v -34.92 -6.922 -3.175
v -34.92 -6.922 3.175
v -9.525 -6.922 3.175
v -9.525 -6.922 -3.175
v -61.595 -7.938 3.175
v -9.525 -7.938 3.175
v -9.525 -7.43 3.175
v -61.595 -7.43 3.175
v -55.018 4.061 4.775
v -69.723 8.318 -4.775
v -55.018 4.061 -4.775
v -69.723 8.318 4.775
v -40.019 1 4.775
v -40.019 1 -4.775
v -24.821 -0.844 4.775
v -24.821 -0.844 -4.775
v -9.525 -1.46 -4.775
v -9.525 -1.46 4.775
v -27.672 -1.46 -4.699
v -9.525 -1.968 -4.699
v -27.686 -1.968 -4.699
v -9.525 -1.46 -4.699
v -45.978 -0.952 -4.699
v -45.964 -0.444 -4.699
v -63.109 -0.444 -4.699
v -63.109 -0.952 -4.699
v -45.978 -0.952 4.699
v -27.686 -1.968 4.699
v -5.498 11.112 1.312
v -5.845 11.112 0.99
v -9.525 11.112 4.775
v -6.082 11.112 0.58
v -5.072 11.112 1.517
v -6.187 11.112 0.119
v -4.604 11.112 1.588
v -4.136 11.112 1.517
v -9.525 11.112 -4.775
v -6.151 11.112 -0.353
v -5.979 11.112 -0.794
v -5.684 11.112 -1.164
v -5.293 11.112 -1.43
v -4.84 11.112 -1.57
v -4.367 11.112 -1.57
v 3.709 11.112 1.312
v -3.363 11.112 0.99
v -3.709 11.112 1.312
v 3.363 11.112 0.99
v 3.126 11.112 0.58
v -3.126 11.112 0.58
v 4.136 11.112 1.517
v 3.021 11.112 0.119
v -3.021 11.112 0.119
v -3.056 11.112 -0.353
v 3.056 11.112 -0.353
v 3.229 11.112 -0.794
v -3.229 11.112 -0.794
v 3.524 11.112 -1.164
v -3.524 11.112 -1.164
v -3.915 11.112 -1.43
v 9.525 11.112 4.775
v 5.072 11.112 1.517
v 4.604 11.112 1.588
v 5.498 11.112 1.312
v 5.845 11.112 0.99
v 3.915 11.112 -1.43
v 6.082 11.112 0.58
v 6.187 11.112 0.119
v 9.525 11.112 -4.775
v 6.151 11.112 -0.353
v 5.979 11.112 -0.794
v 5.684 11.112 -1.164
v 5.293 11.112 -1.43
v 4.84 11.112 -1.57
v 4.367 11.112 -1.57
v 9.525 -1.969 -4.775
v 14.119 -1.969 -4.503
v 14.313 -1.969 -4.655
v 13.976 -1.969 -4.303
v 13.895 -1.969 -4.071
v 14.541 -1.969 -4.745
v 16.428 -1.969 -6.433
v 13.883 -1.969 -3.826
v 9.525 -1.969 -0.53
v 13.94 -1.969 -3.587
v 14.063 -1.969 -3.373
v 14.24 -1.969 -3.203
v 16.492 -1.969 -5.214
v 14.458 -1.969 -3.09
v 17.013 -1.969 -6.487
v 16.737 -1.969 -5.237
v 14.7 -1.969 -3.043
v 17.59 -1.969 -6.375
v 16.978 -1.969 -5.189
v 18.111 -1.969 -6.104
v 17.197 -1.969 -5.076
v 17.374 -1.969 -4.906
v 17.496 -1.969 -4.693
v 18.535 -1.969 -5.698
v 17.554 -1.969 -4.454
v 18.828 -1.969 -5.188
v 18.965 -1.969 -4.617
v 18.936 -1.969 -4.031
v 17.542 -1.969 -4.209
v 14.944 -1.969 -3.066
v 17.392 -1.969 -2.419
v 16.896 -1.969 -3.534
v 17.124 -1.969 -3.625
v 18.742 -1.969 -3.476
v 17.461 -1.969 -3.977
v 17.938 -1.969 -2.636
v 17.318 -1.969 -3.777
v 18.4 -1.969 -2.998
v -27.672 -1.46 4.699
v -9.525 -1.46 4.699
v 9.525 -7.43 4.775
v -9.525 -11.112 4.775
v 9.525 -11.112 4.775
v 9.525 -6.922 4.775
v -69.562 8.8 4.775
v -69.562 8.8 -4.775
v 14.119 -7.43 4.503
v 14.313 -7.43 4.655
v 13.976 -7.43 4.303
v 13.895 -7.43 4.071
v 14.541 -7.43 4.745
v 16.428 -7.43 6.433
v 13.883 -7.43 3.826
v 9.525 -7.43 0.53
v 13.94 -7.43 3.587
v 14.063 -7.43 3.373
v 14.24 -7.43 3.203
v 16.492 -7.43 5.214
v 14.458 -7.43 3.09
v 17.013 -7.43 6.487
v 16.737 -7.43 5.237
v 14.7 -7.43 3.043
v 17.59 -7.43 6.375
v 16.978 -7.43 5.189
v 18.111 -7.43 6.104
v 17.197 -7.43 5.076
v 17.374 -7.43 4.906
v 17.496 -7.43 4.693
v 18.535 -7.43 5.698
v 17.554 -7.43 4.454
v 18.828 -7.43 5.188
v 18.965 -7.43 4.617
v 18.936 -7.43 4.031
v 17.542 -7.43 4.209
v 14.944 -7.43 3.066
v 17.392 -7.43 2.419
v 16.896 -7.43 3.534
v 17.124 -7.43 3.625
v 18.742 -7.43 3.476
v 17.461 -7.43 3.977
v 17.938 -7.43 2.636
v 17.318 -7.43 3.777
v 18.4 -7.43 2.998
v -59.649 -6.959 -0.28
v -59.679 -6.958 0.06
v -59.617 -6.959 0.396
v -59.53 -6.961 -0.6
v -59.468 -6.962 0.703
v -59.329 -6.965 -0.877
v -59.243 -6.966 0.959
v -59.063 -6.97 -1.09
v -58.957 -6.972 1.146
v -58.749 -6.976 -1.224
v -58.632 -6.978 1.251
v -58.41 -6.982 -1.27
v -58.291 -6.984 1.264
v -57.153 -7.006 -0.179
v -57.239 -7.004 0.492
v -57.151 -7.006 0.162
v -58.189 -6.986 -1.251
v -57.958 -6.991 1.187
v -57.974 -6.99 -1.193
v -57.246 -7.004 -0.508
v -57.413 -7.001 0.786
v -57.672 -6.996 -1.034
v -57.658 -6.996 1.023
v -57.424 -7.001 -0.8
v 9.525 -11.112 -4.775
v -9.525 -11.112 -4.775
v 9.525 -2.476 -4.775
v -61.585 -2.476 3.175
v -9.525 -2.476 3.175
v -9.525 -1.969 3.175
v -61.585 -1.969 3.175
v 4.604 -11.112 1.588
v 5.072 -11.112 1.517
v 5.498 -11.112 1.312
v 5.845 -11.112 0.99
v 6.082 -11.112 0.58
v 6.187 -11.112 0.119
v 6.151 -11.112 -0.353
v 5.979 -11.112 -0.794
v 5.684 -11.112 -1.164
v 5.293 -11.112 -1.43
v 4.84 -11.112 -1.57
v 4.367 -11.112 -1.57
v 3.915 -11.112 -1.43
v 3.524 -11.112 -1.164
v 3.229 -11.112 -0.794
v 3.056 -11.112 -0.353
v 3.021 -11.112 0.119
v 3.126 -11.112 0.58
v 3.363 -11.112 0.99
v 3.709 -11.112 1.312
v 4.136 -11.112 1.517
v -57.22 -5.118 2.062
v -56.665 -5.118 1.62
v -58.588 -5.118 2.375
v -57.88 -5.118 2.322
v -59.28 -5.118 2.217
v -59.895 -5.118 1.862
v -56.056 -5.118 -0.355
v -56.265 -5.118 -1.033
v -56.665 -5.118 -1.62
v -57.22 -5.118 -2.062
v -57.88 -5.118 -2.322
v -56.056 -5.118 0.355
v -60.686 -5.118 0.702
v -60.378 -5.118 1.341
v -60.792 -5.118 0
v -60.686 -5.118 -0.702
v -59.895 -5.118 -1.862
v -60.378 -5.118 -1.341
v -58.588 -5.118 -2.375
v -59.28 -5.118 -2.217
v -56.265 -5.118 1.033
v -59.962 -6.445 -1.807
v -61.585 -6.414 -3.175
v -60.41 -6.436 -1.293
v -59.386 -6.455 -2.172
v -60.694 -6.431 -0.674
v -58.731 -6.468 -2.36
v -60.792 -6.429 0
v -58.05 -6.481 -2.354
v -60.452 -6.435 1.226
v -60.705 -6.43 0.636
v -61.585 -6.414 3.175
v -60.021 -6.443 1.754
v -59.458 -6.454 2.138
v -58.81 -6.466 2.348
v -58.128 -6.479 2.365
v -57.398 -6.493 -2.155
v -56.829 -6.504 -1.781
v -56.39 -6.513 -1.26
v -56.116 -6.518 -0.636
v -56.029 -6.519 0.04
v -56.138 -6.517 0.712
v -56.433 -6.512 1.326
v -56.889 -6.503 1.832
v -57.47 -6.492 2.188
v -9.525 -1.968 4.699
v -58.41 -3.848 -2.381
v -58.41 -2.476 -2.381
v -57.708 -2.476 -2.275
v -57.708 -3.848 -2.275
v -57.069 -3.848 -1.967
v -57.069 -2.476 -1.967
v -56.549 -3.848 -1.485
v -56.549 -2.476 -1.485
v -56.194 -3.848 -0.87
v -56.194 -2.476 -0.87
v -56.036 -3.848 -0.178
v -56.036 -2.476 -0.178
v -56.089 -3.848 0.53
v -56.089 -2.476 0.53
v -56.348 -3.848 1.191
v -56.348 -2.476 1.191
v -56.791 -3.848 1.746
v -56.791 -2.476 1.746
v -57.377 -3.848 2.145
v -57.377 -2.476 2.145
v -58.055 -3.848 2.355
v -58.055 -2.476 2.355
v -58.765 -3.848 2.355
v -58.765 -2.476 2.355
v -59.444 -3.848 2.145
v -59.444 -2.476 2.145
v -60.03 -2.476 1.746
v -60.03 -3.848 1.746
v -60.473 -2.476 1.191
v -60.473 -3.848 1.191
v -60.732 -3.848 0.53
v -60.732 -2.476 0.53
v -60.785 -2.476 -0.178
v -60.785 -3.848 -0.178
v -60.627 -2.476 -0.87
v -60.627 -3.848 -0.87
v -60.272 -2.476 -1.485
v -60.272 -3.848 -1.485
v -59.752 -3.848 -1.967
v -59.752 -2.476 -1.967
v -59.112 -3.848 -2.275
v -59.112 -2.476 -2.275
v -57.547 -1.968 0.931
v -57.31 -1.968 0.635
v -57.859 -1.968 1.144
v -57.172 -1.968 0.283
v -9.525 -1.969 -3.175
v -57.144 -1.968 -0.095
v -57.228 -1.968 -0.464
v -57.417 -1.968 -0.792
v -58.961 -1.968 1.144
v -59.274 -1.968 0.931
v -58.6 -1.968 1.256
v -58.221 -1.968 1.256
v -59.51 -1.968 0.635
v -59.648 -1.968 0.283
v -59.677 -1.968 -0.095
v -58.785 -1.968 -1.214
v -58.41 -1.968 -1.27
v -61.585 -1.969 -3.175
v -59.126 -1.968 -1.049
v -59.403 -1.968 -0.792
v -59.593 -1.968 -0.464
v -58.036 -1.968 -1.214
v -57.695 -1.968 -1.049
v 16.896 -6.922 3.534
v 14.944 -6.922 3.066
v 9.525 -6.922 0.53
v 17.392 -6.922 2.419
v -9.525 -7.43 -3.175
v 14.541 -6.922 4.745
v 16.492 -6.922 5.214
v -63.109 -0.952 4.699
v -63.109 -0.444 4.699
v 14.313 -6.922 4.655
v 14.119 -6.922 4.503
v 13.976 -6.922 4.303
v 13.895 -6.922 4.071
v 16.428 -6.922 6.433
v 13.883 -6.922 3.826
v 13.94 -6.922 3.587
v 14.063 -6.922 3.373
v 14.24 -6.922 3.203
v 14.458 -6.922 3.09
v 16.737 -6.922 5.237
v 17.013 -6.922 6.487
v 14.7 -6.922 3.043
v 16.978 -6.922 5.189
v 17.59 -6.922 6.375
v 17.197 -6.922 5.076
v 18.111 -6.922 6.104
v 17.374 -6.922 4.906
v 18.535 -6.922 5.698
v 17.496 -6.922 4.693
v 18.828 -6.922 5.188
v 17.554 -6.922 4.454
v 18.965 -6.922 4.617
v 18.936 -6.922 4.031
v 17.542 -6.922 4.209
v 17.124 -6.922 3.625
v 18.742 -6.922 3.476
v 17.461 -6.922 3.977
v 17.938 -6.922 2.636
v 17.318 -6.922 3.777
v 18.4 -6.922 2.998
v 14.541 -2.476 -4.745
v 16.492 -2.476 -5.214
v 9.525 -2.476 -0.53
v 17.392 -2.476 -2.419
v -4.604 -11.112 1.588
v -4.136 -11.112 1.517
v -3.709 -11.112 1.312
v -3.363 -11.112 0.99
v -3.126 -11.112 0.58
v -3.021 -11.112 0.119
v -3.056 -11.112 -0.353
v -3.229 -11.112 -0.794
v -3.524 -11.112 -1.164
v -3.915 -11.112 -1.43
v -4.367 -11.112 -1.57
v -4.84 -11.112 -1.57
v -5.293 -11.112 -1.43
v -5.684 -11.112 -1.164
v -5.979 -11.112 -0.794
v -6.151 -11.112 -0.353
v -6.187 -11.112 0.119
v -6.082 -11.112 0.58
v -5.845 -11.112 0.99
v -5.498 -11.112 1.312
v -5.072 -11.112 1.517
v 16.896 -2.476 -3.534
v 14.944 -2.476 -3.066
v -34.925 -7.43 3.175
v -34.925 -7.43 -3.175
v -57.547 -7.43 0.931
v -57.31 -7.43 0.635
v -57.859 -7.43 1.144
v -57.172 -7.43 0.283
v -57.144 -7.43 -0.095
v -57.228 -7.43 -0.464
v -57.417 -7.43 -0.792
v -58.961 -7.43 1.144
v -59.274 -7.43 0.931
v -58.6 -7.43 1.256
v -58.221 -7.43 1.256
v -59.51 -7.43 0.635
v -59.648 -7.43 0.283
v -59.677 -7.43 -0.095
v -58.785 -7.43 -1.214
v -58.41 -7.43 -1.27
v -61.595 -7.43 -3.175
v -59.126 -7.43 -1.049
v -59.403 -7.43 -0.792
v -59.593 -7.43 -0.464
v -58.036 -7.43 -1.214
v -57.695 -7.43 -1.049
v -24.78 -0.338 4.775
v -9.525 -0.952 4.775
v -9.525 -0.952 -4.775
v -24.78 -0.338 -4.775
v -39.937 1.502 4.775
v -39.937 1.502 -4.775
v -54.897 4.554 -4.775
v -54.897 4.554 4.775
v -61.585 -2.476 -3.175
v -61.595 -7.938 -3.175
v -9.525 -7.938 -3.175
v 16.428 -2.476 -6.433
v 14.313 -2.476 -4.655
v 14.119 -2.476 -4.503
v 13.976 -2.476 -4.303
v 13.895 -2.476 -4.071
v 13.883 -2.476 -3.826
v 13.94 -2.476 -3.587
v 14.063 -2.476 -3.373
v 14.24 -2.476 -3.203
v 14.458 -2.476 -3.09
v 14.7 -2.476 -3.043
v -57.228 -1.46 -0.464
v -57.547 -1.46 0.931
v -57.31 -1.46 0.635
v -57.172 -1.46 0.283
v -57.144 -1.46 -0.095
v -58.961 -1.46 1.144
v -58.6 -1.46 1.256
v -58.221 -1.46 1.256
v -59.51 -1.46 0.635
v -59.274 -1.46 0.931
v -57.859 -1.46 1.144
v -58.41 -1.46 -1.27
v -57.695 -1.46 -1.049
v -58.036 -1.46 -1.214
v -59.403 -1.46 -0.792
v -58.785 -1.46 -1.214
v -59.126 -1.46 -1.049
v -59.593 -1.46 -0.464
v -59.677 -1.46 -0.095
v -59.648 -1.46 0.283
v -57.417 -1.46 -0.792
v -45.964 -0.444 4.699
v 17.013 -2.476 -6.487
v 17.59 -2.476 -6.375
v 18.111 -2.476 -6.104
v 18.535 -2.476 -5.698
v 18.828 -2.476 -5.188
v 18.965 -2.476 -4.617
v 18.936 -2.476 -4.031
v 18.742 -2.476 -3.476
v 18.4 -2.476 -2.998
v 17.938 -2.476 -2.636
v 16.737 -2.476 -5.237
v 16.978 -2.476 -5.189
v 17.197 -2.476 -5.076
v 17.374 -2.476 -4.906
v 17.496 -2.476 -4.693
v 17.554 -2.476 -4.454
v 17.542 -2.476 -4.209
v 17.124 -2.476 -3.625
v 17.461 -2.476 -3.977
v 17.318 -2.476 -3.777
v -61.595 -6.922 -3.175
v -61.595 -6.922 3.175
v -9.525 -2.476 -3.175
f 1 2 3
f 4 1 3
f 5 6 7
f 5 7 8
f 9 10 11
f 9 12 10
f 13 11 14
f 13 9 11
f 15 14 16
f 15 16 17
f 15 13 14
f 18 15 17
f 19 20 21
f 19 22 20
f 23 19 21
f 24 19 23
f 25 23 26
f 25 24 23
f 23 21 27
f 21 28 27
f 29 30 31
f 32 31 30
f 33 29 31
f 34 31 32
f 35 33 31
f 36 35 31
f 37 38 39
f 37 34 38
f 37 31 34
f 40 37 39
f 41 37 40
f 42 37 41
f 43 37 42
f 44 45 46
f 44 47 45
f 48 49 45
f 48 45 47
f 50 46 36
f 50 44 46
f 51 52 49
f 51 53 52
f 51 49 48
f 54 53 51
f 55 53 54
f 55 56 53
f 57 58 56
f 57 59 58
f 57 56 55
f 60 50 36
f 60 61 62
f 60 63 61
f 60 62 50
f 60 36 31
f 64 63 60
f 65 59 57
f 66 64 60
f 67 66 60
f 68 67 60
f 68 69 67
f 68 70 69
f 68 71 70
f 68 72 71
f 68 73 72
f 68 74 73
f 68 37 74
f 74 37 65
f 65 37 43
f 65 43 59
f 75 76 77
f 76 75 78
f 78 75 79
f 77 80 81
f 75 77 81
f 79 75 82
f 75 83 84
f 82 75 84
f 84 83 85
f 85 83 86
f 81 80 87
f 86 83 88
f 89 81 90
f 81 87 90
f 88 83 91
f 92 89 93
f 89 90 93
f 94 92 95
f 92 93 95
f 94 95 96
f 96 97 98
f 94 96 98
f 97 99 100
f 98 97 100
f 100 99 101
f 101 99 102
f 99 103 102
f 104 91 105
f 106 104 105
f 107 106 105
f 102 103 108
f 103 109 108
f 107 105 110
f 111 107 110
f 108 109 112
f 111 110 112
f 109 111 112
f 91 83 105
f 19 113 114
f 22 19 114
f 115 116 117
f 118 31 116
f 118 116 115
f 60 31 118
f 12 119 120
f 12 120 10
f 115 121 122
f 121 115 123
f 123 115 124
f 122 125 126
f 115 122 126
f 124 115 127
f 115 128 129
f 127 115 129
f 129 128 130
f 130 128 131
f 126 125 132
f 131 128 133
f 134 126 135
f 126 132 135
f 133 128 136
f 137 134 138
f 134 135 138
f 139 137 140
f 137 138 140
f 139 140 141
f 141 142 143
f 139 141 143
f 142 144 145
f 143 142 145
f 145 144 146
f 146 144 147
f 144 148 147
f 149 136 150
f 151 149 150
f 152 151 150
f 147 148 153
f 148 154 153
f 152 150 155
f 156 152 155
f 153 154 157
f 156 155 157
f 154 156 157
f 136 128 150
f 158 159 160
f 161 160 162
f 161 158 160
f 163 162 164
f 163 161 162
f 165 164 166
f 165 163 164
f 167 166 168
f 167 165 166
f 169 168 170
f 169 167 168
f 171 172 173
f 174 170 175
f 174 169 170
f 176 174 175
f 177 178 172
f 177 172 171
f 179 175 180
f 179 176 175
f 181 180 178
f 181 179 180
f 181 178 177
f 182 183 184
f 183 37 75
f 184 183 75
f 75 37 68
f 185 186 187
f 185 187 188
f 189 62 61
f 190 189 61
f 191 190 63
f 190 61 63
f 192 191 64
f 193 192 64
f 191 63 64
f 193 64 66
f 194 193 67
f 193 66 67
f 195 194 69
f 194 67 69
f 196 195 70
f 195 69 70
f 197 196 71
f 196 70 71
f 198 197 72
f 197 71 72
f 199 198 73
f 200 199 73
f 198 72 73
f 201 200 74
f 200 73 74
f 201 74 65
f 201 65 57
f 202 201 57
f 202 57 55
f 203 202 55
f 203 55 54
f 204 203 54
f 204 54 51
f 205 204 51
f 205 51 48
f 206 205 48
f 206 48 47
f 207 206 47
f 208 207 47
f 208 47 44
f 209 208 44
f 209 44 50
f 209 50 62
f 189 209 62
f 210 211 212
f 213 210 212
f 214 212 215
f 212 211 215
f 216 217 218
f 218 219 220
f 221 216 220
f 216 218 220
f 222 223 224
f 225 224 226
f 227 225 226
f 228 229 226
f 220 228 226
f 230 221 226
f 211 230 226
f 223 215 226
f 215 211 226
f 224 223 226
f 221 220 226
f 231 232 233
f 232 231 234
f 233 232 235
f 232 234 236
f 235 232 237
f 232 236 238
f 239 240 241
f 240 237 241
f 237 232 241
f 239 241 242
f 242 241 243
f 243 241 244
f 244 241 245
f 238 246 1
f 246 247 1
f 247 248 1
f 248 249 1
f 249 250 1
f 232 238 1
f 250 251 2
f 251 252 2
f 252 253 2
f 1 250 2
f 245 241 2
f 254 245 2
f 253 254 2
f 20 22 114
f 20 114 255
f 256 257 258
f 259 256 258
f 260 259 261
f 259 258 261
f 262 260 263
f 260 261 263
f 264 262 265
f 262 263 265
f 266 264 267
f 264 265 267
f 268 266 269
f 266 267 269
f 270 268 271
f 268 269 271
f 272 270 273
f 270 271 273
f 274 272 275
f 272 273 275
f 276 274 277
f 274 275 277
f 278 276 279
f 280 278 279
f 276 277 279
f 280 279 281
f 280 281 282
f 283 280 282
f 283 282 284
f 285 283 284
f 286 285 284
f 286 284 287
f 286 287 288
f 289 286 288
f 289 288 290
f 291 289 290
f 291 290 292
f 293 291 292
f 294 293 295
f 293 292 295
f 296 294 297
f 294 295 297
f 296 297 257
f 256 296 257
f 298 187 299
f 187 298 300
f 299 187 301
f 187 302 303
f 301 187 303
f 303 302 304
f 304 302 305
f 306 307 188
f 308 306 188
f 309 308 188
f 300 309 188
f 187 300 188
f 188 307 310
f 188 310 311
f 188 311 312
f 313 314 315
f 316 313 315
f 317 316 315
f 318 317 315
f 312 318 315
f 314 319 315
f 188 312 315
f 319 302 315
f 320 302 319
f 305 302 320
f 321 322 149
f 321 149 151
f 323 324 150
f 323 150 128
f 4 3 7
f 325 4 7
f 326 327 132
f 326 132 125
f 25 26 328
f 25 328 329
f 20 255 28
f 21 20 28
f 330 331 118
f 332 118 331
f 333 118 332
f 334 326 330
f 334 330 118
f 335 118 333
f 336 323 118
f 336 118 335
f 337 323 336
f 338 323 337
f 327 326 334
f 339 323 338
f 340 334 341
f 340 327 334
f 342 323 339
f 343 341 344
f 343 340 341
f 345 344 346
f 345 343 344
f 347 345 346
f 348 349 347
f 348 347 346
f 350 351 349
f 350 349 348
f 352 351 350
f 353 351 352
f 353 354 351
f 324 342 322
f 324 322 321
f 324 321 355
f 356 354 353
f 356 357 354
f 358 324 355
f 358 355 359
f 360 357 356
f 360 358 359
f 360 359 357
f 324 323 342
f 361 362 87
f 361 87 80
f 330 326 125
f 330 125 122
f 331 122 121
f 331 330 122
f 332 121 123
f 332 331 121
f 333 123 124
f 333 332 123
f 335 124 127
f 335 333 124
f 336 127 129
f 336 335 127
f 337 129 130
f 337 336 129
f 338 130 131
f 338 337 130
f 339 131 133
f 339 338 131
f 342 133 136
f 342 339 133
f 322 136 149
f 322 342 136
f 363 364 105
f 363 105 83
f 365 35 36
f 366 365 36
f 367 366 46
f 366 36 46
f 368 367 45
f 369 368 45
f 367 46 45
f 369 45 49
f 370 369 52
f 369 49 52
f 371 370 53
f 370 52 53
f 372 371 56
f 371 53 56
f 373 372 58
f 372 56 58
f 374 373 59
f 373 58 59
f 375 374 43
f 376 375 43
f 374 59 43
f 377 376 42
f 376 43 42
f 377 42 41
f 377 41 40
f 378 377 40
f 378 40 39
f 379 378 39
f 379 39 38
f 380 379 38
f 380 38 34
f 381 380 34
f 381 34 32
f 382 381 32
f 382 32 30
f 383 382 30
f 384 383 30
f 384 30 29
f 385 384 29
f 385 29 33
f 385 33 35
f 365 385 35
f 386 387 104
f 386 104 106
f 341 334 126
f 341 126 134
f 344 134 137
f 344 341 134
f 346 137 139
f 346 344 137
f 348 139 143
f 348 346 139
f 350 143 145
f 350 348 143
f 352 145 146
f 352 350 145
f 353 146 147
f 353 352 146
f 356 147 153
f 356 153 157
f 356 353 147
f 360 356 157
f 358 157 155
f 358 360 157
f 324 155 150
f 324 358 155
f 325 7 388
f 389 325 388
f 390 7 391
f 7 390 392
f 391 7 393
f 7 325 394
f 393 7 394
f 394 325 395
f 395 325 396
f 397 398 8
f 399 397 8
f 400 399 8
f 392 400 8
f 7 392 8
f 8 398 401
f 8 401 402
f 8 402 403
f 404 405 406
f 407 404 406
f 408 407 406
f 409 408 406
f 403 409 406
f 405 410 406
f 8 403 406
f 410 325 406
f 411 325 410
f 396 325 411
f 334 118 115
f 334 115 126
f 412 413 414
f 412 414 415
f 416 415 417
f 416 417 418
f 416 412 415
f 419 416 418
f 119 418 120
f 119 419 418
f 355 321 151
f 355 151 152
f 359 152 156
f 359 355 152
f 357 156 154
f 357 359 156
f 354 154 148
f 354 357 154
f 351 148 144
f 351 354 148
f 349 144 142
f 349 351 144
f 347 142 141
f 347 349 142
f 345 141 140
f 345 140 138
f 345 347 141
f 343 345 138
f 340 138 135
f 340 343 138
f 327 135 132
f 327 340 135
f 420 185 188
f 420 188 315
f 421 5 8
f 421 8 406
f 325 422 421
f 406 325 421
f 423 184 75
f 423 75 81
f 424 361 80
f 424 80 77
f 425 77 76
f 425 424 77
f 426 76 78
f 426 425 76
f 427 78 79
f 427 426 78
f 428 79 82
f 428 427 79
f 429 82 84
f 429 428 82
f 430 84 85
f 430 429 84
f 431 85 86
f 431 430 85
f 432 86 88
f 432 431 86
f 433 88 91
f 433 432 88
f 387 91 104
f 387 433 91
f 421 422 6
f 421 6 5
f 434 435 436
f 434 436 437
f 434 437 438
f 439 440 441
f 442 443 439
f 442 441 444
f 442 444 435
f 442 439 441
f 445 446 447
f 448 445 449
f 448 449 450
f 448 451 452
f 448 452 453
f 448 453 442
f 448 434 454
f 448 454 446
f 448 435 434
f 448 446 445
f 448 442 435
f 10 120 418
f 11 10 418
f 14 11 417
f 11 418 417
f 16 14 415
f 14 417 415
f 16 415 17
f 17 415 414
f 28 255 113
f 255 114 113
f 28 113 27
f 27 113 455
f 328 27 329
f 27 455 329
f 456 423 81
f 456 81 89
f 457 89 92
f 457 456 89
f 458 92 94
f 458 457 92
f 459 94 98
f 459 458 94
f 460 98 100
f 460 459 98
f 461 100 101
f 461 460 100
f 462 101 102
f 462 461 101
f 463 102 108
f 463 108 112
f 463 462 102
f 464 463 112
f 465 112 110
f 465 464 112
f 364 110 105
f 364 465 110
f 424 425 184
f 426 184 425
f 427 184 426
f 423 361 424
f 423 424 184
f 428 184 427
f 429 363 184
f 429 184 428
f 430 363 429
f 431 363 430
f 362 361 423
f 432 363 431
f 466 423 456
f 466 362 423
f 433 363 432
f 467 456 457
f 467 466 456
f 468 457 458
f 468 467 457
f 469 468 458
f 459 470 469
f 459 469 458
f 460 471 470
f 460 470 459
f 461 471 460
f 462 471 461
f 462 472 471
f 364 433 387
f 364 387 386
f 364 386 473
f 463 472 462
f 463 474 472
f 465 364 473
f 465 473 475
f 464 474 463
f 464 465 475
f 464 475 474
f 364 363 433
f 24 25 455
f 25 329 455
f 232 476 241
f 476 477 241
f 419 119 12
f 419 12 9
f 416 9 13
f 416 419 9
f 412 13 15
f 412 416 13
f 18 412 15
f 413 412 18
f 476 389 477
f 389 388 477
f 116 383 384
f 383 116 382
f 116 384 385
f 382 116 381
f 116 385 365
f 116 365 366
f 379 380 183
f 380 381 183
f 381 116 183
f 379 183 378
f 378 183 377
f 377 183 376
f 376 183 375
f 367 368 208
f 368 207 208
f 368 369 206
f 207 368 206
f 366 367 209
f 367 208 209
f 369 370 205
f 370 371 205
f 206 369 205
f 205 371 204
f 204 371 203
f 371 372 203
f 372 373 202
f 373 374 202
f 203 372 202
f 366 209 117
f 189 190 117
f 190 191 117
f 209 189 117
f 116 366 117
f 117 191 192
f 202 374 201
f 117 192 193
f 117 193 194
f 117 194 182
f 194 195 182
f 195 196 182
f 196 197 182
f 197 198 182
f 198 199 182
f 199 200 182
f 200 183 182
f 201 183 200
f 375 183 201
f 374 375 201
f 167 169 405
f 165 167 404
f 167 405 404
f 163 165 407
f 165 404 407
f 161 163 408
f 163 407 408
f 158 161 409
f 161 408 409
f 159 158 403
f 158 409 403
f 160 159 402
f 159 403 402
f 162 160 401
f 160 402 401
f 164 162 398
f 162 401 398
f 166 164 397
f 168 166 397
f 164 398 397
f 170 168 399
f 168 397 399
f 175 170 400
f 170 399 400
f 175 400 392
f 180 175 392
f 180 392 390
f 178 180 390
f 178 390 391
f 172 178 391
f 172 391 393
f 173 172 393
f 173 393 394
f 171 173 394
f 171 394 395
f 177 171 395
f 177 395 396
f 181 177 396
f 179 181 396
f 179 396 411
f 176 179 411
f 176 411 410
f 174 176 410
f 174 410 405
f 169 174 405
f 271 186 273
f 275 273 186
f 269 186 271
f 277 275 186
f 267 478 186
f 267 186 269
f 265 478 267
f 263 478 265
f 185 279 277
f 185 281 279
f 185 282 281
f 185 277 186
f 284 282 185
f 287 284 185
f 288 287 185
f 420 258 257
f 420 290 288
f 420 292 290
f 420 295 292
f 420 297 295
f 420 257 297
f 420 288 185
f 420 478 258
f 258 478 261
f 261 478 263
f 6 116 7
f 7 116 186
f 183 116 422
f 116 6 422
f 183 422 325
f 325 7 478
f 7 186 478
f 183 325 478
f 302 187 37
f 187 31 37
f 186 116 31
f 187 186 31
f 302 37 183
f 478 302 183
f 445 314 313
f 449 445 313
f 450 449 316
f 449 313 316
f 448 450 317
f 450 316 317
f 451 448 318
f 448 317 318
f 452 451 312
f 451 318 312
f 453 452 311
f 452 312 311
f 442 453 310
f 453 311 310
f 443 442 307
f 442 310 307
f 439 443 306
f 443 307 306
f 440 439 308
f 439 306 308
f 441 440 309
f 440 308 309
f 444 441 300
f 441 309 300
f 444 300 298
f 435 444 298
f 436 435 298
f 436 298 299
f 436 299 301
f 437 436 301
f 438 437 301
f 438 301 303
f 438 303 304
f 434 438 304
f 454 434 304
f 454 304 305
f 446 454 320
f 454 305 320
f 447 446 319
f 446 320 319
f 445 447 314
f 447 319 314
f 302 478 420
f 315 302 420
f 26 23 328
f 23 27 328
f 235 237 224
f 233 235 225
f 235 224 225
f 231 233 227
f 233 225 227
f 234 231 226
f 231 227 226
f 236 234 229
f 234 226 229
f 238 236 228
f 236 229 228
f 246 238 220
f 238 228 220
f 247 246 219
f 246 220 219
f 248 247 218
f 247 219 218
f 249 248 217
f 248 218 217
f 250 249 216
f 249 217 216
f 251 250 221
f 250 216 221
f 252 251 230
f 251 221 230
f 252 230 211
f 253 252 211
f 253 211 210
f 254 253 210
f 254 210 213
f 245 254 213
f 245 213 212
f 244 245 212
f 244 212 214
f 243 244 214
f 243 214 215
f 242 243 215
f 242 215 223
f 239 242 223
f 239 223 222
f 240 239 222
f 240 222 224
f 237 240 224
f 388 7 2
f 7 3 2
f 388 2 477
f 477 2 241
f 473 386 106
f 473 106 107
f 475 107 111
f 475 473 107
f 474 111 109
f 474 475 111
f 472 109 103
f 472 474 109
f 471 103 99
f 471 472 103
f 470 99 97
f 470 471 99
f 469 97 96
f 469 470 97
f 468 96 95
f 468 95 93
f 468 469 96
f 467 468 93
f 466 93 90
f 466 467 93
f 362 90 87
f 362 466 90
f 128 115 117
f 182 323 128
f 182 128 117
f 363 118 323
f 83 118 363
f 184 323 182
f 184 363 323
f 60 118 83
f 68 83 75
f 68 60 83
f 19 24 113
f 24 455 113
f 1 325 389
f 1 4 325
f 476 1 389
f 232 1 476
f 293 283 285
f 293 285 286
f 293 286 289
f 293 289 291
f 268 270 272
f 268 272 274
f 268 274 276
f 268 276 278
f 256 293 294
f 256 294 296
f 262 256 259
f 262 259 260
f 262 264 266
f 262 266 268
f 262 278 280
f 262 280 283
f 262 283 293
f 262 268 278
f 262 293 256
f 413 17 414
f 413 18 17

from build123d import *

# Parameters (mm, degrees)
SKETCH1_W            = 19.05
SKETCH1_H            = 9.5504
BOSS_EXTRUDE1_DEPTH  = 11.1125
SKETCH2_W            = 52.07
SKETCH2_H            = 6.35
BOSS_EXTRUDE2_DEPTH  = 0.508
BOSS_EXTRUDE3_DEPTH  = 3.175
SKETCH4_W            = 52.060325564
SKETCH4_H            = 6.35
BOSS_EXTRUDE4_DEPTH  = 0.508
BOSS_EXTRUDE5_DEPTH  = 4.699
BOSS_EXTRUDE6_DEPTH  = 4.7752
SKETCH7_R            = 2.38125
BOSS_EXTRUDE7_DEPTH  = 1.3716
BOSS_EXTRUDE8_REACH  = 74.74
BOSS_EXTRUDE8_START  = 1.27
SKETCH8_R            = 2.38125
SKETCH9_R            = 1.27
BOSS_EXTRUDE9_DEPTH  = 0.508
BOSS_EXTRUDE10_REACH = 74.304
SKETCH10_R           = 1.27
BOSS_EXTRUDE11_DEPTH = 0.508
BOSS_EXTRUDE12_DEPTH = 0.508
SKETCH13_R           = 1.5875
CUT_EXTRUDE1_DEPTH   = 74.466751392


with BuildPart() as part:
    # Sketch1 → Boss-Extrude1 (new, symmetric)
    with BuildSketch(Plane(origin=(0, 0, 0), x_dir=(1, 0, 0), z_dir=(0, 1, 0))):
        Rectangle(SKETCH1_W, SKETCH1_H)
    extrude(amount=BOSS_EXTRUDE1_DEPTH, both=True)

    # Sketch2 → Boss-Extrude2 (add)
    with BuildSketch(Plane(origin=(0, -7.9375, 0), x_dir=(-1, 0, 0), z_dir=(0, -1, 0))):
        with Locations((35.56, 0)):
            Rectangle(SKETCH2_W, SKETCH2_H)
    extrude(amount=-BOSS_EXTRUDE2_DEPTH)

    # Sketch4 → Boss-Extrude4 (add)
    with BuildSketch(Plane(origin=(0, -2.4765, 0), x_dir=(-1, 0, 0), z_dir=(0, -1, 0))):
        with Locations((35.555162782, 0)):
            Rectangle(SKETCH4_W, SKETCH4_H)
    extrude(amount=-BOSS_EXTRUDE4_DEPTH)

    # Sketch7 → Boss-Extrude7 (add)
    with BuildSketch(Plane.XZ.offset(2.4765)):
        with Locations(Location((-58.410325564, 0, 0), (0, 0, 270))):
            Circle(SKETCH7_R)
    extrude(amount=BOSS_EXTRUDE7_DEPTH)

    # Sketch9 → Boss-Extrude9 (add)
    with BuildSketch(Plane(origin=(0, -1.9685, 0), x_dir=(1, 0, 0), z_dir=(0, 1, 0))):
        with Locations(Location((-58.410325564, 0, 0), (0, 0, 90))):
            Circle(SKETCH9_R)
    extrude(amount=BOSS_EXTRUDE9_DEPTH)

    # Boss-Extrude10: up to this plane
    boss_extrude10_end = Plane(origin=(-34.925, -7.4295, 3.175), z_dir=(0.01904416463717227, 0.9998186434515374, 0))
    # Sketch10 → Boss-Extrude10 (add, up to the surface)
    with BuildSketch(Plane(origin=(0, -7.4295, 0), x_dir=(1, 0, 0), z_dir=(0, 1, 0)), mode=Mode.PRIVATE) as boss_extrude10_sk1:
        with Locations(Location((-58.410325564, 0, 0), (0, 0, 90))):
            Circle(SKETCH10_R)
    boss_extrude10_tool1 = split(extrude(boss_extrude10_sk1.sketch, amount=BOSS_EXTRUDE10_REACH, mode=Mode.PRIVATE), bisect_by=boss_extrude10_end, keep=Keep.BOTH, mode=Mode.PRIVATE)
    add(boss_extrude10_tool1.solids().sort_by_distance((-58.410326, -7.4295, 0))[0])

    # Sketch11 → Boss-Extrude11 (add)
    with BuildSketch(Plane(origin=(0, -6.9215, 0), x_dir=(1, 0, 0), z_dir=(0, 1, 0))):
        with BuildLine():
            Line((9.525, -4.7752), (16.428236393, -6.432668643))
            ThreePointArc((16.428236393, -6.432668643), (18.916768643, -4.907763607), (17.391863607, -2.419231357))
            Line((17.391863607, -2.419231357), (9.525, -0.530395599))
            Line((9.525, -0.530395599), (9.525, -4.7752))
        make_face()
        with BuildLine():
            Line((14.944414329, -3.065856734), (16.895562302, -3.53432781))
            ThreePointArc((16.895562302, -3.53432781), (17.533676409, -4.575682844), (16.492321375, -5.213796951))
            Line((16.492321375, -5.213796951), (14.541173403, -4.745325875))
            ThreePointArc((14.541173403, -4.745325875), (13.903059295, -3.703970842), (14.944414329, -3.065856734))
        make_face(mode=Mode.SUBTRACT)
    extrude(amount=-BOSS_EXTRUDE11_DEPTH)

    # Sketch12 → Boss-Extrude12 (add)
    with BuildSketch(Plane.XZ.offset(2.4765)):
        with BuildLine():
            Line((9.525, -4.7752), (16.428236393, -6.432668643))
            ThreePointArc((16.428236393, -6.432668643), (18.916768643, -4.907763607), (17.391863607, -2.419231357))
            Line((17.391863607, -2.419231357), (9.525, -0.530395599))
            Line((9.525, -0.530395599), (9.525, -4.7752))
        make_face()
        with BuildLine():
            Line((14.944414329, -3.065856734), (16.895562302, -3.53432781))
            ThreePointArc((16.895562302, -3.53432781), (17.533676409, -4.575682844), (16.492321375, -5.213796951))
            Line((16.492321375, -5.213796951), (14.541173403, -4.745325875))
            ThreePointArc((14.541173403, -4.745325875), (13.903059295, -3.703970842), (14.944414329, -3.065856734))
        make_face(mode=Mode.SUBTRACT)
    extrude(amount=-BOSS_EXTRUDE12_DEPTH)

    # Sketch13 → Cut-Extrude1 (cut, through all)
    with BuildSketch(Plane(origin=(0, 11.1125, 0), x_dir=(1, 0, 0), z_dir=(0, 1, 0))):
        with Locations(Location((-4.60375, 0, 0), (0, 0, 270))):
            Circle(SKETCH13_R)
        with Locations(Location((4.60375, 0, 0), (0, 0, 270))):
            Circle(SKETCH13_R)
    extrude(amount=-CUT_EXTRUDE1_DEPTH, mode=Mode.SUBTRACT)


with BuildPart() as body_2:
    # Sketch3 → Boss-Extrude3 (new, symmetric)
    with BuildSketch(Plane.XY):
        Polygon((-9.525, -7.4295), (-34.925, -7.4295), (-61.595, -6.9215), (-61.585325564, -6.413592129), (-34.920162344, -6.9215), (-9.525, -6.9215), align=None)
    extrude(amount=BOSS_EXTRUDE3_DEPTH, both=True)

    # Boss-Extrude8: up to this plane
    boss_extrude8_end = Plane(origin=(-61.585325564, -6.413592129, 3.175), z_dir=(-0.01904416463717216, -0.9998186434515374, 0))
    # Sketch8 → Boss-Extrude8 (add, up to the surface)
    with BuildSketch(Plane.XZ.offset(3.8481).offset(BOSS_EXTRUDE8_START), mode=Mode.PRIVATE) as boss_extrude8_sk1:
        with Locations(Location((-58.410325564, 0, 0), (0, 0, 180))):
            Circle(SKETCH8_R)
    boss_extrude8_tool1 = split(extrude(boss_extrude8_sk1.sketch, amount=BOSS_EXTRUDE8_REACH, mode=Mode.PRIVATE), bisect_by=boss_extrude8_end, keep=Keep.BOTH, mode=Mode.PRIVATE)
    add(boss_extrude8_tool1.solids().sort_by_distance((-58.410326, -5.1181, 0))[0])


with BuildPart() as body_3:
    # Sketch5 → Boss-Extrude5 (new, symmetric)
    with BuildSketch(Plane.XY):
        Polygon((-9.525, -1.9685), (-27.686, -1.9685), (-45.9784224, -0.9525), (-63.109325564, -0.9525), (-63.109325564, -0.4445), (-45.964325564, -0.4445), (-27.671903164, -1.4605), (-9.525, -1.4605), align=None)
    extrude(amount=BOSS_EXTRUDE5_DEPTH, both=True)


with BuildPart() as body_4:
    # Sketch6 → Boss-Extrude6 (new, symmetric)
    with BuildSketch(Plane.XY):
        with BuildLine():
            Line((-9.525, -1.4605), (-9.525, -0.9525))
            ThreePointArc((-9.525, -0.9525), (-39.937101444, 1.501596306), (-69.562197034, 8.800377999))
            Line((-69.562197034, 8.800377999), (-69.723, 8.3185))
            ThreePointArc((-69.723, 8.3185), (-40.018556881, 1.00016933), (-9.525, -1.4605))
        make_face()
    extrude(amount=BOSS_EXTRUDE6_DEPTH, both=True)


solid = Compound([part.part, body_2.part, body_3.part, body_4.part])
